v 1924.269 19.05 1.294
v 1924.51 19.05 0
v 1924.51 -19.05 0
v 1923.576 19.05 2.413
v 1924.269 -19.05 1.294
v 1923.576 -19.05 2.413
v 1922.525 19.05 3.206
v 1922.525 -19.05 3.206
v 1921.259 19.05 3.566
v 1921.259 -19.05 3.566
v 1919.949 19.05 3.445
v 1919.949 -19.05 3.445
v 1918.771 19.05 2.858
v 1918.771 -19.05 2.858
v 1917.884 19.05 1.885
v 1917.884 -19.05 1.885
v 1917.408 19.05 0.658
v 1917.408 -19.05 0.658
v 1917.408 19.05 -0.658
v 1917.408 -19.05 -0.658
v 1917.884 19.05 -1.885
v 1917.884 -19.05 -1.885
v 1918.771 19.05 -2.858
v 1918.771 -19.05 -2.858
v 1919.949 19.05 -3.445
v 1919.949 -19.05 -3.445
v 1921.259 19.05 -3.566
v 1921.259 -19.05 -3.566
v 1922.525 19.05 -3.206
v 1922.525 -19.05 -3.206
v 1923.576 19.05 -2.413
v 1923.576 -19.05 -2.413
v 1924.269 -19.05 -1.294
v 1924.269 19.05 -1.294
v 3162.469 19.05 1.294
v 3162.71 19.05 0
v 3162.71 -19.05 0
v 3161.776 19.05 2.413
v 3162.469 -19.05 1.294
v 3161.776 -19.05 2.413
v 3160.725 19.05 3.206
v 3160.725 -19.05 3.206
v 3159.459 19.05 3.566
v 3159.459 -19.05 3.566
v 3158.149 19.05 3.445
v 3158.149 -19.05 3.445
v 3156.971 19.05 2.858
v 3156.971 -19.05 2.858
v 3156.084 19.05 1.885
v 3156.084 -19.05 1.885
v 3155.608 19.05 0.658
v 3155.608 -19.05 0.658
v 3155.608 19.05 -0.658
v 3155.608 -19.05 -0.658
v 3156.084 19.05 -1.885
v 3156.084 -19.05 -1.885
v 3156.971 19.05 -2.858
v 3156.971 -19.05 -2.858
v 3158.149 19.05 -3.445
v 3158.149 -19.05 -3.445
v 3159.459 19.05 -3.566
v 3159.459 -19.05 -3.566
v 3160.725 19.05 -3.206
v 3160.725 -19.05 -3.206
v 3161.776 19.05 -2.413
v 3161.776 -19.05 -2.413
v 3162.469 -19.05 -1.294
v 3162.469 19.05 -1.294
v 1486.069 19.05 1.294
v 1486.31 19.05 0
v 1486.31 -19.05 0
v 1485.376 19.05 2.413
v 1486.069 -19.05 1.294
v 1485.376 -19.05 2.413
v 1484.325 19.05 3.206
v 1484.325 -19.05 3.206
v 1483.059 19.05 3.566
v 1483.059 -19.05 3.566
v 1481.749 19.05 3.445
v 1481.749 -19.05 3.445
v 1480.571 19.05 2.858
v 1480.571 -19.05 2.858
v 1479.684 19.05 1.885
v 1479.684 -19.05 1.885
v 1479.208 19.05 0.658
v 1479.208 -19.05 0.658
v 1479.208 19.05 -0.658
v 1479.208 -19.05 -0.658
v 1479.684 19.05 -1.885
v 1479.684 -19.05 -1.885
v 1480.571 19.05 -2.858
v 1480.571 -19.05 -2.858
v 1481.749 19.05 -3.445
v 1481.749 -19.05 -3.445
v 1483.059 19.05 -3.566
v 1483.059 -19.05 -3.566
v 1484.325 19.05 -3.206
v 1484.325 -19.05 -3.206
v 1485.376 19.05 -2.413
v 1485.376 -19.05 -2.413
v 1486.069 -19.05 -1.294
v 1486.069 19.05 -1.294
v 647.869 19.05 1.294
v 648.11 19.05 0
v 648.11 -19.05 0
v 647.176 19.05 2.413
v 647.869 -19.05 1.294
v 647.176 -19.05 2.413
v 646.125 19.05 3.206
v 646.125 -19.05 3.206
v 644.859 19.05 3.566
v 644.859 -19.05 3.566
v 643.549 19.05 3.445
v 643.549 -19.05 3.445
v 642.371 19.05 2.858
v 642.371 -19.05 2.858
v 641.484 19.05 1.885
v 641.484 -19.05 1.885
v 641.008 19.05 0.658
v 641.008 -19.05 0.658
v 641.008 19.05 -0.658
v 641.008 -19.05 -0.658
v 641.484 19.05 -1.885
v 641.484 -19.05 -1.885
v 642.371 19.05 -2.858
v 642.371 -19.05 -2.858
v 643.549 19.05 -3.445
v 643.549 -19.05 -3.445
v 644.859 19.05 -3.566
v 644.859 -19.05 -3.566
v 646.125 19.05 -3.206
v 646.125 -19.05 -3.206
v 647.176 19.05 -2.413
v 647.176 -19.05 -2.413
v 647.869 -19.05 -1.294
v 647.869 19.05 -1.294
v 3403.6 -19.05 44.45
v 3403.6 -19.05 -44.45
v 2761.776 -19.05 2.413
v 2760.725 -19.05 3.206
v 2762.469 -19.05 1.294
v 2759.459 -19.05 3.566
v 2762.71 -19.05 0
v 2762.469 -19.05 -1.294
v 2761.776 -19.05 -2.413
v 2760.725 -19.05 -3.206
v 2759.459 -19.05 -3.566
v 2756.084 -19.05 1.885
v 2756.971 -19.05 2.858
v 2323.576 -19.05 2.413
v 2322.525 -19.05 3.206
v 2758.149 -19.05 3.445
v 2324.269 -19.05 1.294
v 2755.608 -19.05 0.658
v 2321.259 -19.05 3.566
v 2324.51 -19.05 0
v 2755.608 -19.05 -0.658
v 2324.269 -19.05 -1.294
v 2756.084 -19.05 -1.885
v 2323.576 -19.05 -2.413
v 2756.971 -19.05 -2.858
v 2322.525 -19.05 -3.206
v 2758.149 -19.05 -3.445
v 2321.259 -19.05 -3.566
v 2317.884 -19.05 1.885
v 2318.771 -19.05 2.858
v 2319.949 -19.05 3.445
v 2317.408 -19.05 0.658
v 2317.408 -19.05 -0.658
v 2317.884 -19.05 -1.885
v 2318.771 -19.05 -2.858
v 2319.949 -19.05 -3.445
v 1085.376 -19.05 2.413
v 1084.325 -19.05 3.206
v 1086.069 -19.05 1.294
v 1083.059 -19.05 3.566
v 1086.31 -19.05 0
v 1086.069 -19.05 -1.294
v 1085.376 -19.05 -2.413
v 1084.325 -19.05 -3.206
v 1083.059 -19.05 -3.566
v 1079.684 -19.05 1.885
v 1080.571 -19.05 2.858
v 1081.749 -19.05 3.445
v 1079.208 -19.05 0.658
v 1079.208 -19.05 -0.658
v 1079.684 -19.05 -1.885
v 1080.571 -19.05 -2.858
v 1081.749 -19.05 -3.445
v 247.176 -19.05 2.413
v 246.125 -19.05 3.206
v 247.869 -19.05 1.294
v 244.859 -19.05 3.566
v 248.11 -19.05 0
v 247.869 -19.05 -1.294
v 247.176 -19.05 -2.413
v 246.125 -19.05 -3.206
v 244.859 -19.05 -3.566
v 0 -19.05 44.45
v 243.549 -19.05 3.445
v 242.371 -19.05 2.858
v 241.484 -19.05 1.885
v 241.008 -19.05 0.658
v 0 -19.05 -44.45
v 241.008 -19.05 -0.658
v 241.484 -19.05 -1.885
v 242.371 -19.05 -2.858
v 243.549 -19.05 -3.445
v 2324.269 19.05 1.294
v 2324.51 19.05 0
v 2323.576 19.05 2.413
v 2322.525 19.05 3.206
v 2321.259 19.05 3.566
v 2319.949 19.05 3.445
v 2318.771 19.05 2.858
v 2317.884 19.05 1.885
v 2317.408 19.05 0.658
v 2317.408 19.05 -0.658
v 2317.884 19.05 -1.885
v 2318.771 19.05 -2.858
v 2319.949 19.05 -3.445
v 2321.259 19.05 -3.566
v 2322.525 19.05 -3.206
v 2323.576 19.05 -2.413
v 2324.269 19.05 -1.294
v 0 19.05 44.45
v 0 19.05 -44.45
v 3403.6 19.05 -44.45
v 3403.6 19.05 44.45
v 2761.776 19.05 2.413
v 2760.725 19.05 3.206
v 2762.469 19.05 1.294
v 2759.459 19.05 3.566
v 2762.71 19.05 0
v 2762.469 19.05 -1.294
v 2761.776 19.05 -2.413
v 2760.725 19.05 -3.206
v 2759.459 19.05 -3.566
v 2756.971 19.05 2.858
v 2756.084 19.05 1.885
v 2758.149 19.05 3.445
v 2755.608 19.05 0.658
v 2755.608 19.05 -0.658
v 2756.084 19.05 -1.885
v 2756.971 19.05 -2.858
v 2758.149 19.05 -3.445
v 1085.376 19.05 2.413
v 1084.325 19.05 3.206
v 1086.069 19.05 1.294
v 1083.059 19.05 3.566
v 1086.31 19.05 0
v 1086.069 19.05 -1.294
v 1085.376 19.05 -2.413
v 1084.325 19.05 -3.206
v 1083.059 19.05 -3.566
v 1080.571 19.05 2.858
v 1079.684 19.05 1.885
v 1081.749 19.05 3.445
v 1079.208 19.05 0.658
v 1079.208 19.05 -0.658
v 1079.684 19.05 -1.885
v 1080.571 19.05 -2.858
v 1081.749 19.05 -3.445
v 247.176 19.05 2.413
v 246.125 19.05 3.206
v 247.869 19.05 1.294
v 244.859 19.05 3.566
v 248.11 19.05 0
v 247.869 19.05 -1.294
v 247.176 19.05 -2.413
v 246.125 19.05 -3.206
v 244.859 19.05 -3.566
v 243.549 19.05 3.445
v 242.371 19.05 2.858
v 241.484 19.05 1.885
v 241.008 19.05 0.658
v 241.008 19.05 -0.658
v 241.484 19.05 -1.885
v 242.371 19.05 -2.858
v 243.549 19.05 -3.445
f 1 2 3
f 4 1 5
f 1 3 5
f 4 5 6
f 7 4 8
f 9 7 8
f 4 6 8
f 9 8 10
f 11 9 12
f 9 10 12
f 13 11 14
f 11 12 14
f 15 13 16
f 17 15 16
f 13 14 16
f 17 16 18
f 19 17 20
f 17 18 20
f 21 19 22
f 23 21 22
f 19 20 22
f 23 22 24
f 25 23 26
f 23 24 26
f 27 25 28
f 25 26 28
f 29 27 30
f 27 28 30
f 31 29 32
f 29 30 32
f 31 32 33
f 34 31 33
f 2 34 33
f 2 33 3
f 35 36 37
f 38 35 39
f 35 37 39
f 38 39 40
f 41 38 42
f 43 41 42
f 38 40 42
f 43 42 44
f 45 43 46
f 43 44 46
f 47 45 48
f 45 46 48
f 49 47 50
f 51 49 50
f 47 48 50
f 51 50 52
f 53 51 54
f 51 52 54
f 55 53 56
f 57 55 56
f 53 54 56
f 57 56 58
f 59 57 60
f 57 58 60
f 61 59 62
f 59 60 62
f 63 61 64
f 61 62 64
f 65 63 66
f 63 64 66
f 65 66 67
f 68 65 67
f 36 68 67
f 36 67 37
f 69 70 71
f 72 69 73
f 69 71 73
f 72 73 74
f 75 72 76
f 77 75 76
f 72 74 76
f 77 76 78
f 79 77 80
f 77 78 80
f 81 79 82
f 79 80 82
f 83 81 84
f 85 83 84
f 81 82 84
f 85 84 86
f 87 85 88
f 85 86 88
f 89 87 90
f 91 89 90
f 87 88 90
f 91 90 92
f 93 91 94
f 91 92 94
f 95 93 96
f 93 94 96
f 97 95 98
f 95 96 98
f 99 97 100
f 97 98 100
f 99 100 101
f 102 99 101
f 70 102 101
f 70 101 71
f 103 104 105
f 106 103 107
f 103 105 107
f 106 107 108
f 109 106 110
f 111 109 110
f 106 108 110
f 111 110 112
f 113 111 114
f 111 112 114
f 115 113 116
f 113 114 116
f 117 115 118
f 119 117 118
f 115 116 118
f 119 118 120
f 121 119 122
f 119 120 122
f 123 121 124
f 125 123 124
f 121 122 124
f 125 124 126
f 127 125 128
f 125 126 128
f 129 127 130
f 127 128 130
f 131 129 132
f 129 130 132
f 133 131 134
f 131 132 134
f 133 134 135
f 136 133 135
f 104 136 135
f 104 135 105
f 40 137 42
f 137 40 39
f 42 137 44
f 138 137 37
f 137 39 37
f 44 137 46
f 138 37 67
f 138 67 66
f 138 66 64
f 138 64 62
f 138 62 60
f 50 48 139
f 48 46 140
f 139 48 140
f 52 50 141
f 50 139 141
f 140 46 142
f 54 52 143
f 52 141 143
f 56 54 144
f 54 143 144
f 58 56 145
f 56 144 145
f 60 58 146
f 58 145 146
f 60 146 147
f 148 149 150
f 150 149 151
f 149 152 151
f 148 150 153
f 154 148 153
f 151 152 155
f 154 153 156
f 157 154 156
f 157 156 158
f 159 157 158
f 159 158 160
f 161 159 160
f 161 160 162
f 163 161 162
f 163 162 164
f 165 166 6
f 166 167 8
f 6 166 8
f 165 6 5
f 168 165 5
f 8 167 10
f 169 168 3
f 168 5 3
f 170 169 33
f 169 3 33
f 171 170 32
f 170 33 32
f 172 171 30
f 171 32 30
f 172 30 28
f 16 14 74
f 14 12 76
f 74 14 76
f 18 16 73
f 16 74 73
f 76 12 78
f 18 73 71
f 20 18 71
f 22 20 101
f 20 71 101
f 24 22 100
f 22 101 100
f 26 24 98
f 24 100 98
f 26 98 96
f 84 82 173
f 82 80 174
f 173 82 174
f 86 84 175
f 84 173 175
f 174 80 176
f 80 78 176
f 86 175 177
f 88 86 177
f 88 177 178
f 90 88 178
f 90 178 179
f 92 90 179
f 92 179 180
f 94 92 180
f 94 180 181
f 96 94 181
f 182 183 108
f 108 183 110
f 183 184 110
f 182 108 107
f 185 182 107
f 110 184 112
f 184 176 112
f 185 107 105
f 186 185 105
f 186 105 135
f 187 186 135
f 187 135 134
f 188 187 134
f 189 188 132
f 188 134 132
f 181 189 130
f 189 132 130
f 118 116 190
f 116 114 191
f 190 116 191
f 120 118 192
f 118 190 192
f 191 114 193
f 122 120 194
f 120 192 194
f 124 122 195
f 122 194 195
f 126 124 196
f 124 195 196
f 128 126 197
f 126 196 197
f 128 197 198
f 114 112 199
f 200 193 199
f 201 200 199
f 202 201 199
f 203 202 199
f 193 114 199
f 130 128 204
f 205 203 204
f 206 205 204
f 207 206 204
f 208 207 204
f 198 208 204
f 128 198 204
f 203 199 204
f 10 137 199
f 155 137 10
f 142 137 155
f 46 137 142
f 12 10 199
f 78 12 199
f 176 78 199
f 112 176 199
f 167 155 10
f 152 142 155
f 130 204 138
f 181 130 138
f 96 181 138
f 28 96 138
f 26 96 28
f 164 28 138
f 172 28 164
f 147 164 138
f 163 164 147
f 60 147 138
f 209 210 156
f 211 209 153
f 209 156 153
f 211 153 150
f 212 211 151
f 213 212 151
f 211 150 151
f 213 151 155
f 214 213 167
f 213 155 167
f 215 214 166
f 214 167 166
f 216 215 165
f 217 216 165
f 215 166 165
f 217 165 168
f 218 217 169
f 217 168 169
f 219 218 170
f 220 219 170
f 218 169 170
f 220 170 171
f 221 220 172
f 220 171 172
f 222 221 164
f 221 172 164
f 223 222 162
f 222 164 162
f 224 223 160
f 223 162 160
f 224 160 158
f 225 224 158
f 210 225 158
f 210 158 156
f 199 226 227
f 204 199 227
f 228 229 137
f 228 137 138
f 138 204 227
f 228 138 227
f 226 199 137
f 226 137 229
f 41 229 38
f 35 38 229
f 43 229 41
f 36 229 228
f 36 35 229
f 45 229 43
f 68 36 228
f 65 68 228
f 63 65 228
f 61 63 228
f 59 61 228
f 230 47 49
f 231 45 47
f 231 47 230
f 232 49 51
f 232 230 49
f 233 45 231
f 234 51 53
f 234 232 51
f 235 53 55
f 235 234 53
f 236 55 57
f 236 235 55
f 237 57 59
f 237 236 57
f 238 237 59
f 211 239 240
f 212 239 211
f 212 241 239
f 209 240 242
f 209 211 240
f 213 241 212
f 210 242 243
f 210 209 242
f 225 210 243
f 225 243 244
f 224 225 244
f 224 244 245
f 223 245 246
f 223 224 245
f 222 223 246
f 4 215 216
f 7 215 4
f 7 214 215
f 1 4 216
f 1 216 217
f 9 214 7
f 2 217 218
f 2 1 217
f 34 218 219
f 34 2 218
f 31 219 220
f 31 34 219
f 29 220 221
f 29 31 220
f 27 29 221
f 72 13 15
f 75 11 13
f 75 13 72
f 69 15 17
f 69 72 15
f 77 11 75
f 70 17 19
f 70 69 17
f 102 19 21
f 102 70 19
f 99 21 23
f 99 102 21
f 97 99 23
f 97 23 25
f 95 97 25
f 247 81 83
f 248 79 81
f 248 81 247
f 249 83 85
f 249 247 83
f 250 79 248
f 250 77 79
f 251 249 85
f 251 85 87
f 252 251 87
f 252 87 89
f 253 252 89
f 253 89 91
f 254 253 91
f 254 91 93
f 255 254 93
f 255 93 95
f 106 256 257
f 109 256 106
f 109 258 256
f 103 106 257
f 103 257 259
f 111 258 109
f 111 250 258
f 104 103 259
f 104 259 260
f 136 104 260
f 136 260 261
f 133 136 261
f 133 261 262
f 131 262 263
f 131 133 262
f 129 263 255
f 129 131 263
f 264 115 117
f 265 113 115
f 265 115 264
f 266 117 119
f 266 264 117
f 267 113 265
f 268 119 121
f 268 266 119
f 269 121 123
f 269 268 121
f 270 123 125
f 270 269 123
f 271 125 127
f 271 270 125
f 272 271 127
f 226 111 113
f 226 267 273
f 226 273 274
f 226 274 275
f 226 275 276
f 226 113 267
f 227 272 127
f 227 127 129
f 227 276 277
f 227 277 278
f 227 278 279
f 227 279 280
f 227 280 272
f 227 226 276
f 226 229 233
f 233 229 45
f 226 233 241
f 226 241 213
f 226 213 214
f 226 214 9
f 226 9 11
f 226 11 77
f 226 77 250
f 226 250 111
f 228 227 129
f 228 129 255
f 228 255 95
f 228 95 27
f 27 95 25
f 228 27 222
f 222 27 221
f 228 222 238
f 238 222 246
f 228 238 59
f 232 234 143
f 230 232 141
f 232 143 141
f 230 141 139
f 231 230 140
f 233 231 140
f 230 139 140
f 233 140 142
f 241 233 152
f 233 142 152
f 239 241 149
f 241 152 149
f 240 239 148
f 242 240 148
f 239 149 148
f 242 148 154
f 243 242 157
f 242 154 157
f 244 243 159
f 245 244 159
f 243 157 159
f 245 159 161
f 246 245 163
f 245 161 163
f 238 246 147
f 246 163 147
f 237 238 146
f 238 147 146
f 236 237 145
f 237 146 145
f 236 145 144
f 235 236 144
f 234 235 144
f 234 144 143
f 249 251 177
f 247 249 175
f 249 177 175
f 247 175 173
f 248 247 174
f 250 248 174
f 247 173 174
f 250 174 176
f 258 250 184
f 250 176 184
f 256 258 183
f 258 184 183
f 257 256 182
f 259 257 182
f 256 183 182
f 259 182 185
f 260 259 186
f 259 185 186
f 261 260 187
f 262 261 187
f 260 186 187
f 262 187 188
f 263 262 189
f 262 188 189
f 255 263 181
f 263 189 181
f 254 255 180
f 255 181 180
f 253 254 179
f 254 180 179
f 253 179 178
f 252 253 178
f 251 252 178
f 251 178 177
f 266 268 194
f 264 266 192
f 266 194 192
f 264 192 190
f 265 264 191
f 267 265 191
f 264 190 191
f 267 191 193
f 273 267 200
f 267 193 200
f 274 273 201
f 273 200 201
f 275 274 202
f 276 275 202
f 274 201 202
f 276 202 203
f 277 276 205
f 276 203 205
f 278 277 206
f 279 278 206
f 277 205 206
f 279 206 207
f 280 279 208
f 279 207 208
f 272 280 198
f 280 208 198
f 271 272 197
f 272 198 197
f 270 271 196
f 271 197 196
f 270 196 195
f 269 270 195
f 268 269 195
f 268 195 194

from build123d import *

# Parameters (mm, degrees)
SKETCH1_W           = 88.9
SKETCH1_H           = 38.1
BOSS_EXTRUDE1_DEPTH = 3403.6
SKETCH2_R           = 3.5815
CUT_EXTRUDE1_DEPTH  = 39.1


with BuildPart() as part:
    # Sketch1 → Boss-Extrude1 (new body)
    with BuildSketch(Plane(origin=(0, 0, 0), x_dir=(0, 0, -1), z_dir=(1, 0, 0))):
        Rectangle(SKETCH1_W, SKETCH1_H)
    extrude(amount=BOSS_EXTRUDE1_DEPTH)

    # Sketch2 → Cut-Extrude1 (cut, through all)
    with BuildSketch(Plane.XZ.offset(19.05)):
        with Locations((244.529, 0)):
            Circle(SKETCH2_R)
        with Locations((644.529, 0)):
            Circle(SKETCH2_R)
        with Locations((1082.729, 0)):
            Circle(SKETCH2_R)
        with Locations((1482.729, 0)):
            Circle(SKETCH2_R)
        with Locations((1920.929, 0)):
            Circle(SKETCH2_R)
        with Locations((2320.929, 0)):
            Circle(SKETCH2_R)
        with Locations((2759.129, 0)):
            Circle(SKETCH2_R)
        with Locations((3159.129, 0)):
            Circle(SKETCH2_R)
    extrude(amount=-CUT_EXTRUDE1_DEPTH, mode=Mode.SUBTRACT)


solid = part.part
